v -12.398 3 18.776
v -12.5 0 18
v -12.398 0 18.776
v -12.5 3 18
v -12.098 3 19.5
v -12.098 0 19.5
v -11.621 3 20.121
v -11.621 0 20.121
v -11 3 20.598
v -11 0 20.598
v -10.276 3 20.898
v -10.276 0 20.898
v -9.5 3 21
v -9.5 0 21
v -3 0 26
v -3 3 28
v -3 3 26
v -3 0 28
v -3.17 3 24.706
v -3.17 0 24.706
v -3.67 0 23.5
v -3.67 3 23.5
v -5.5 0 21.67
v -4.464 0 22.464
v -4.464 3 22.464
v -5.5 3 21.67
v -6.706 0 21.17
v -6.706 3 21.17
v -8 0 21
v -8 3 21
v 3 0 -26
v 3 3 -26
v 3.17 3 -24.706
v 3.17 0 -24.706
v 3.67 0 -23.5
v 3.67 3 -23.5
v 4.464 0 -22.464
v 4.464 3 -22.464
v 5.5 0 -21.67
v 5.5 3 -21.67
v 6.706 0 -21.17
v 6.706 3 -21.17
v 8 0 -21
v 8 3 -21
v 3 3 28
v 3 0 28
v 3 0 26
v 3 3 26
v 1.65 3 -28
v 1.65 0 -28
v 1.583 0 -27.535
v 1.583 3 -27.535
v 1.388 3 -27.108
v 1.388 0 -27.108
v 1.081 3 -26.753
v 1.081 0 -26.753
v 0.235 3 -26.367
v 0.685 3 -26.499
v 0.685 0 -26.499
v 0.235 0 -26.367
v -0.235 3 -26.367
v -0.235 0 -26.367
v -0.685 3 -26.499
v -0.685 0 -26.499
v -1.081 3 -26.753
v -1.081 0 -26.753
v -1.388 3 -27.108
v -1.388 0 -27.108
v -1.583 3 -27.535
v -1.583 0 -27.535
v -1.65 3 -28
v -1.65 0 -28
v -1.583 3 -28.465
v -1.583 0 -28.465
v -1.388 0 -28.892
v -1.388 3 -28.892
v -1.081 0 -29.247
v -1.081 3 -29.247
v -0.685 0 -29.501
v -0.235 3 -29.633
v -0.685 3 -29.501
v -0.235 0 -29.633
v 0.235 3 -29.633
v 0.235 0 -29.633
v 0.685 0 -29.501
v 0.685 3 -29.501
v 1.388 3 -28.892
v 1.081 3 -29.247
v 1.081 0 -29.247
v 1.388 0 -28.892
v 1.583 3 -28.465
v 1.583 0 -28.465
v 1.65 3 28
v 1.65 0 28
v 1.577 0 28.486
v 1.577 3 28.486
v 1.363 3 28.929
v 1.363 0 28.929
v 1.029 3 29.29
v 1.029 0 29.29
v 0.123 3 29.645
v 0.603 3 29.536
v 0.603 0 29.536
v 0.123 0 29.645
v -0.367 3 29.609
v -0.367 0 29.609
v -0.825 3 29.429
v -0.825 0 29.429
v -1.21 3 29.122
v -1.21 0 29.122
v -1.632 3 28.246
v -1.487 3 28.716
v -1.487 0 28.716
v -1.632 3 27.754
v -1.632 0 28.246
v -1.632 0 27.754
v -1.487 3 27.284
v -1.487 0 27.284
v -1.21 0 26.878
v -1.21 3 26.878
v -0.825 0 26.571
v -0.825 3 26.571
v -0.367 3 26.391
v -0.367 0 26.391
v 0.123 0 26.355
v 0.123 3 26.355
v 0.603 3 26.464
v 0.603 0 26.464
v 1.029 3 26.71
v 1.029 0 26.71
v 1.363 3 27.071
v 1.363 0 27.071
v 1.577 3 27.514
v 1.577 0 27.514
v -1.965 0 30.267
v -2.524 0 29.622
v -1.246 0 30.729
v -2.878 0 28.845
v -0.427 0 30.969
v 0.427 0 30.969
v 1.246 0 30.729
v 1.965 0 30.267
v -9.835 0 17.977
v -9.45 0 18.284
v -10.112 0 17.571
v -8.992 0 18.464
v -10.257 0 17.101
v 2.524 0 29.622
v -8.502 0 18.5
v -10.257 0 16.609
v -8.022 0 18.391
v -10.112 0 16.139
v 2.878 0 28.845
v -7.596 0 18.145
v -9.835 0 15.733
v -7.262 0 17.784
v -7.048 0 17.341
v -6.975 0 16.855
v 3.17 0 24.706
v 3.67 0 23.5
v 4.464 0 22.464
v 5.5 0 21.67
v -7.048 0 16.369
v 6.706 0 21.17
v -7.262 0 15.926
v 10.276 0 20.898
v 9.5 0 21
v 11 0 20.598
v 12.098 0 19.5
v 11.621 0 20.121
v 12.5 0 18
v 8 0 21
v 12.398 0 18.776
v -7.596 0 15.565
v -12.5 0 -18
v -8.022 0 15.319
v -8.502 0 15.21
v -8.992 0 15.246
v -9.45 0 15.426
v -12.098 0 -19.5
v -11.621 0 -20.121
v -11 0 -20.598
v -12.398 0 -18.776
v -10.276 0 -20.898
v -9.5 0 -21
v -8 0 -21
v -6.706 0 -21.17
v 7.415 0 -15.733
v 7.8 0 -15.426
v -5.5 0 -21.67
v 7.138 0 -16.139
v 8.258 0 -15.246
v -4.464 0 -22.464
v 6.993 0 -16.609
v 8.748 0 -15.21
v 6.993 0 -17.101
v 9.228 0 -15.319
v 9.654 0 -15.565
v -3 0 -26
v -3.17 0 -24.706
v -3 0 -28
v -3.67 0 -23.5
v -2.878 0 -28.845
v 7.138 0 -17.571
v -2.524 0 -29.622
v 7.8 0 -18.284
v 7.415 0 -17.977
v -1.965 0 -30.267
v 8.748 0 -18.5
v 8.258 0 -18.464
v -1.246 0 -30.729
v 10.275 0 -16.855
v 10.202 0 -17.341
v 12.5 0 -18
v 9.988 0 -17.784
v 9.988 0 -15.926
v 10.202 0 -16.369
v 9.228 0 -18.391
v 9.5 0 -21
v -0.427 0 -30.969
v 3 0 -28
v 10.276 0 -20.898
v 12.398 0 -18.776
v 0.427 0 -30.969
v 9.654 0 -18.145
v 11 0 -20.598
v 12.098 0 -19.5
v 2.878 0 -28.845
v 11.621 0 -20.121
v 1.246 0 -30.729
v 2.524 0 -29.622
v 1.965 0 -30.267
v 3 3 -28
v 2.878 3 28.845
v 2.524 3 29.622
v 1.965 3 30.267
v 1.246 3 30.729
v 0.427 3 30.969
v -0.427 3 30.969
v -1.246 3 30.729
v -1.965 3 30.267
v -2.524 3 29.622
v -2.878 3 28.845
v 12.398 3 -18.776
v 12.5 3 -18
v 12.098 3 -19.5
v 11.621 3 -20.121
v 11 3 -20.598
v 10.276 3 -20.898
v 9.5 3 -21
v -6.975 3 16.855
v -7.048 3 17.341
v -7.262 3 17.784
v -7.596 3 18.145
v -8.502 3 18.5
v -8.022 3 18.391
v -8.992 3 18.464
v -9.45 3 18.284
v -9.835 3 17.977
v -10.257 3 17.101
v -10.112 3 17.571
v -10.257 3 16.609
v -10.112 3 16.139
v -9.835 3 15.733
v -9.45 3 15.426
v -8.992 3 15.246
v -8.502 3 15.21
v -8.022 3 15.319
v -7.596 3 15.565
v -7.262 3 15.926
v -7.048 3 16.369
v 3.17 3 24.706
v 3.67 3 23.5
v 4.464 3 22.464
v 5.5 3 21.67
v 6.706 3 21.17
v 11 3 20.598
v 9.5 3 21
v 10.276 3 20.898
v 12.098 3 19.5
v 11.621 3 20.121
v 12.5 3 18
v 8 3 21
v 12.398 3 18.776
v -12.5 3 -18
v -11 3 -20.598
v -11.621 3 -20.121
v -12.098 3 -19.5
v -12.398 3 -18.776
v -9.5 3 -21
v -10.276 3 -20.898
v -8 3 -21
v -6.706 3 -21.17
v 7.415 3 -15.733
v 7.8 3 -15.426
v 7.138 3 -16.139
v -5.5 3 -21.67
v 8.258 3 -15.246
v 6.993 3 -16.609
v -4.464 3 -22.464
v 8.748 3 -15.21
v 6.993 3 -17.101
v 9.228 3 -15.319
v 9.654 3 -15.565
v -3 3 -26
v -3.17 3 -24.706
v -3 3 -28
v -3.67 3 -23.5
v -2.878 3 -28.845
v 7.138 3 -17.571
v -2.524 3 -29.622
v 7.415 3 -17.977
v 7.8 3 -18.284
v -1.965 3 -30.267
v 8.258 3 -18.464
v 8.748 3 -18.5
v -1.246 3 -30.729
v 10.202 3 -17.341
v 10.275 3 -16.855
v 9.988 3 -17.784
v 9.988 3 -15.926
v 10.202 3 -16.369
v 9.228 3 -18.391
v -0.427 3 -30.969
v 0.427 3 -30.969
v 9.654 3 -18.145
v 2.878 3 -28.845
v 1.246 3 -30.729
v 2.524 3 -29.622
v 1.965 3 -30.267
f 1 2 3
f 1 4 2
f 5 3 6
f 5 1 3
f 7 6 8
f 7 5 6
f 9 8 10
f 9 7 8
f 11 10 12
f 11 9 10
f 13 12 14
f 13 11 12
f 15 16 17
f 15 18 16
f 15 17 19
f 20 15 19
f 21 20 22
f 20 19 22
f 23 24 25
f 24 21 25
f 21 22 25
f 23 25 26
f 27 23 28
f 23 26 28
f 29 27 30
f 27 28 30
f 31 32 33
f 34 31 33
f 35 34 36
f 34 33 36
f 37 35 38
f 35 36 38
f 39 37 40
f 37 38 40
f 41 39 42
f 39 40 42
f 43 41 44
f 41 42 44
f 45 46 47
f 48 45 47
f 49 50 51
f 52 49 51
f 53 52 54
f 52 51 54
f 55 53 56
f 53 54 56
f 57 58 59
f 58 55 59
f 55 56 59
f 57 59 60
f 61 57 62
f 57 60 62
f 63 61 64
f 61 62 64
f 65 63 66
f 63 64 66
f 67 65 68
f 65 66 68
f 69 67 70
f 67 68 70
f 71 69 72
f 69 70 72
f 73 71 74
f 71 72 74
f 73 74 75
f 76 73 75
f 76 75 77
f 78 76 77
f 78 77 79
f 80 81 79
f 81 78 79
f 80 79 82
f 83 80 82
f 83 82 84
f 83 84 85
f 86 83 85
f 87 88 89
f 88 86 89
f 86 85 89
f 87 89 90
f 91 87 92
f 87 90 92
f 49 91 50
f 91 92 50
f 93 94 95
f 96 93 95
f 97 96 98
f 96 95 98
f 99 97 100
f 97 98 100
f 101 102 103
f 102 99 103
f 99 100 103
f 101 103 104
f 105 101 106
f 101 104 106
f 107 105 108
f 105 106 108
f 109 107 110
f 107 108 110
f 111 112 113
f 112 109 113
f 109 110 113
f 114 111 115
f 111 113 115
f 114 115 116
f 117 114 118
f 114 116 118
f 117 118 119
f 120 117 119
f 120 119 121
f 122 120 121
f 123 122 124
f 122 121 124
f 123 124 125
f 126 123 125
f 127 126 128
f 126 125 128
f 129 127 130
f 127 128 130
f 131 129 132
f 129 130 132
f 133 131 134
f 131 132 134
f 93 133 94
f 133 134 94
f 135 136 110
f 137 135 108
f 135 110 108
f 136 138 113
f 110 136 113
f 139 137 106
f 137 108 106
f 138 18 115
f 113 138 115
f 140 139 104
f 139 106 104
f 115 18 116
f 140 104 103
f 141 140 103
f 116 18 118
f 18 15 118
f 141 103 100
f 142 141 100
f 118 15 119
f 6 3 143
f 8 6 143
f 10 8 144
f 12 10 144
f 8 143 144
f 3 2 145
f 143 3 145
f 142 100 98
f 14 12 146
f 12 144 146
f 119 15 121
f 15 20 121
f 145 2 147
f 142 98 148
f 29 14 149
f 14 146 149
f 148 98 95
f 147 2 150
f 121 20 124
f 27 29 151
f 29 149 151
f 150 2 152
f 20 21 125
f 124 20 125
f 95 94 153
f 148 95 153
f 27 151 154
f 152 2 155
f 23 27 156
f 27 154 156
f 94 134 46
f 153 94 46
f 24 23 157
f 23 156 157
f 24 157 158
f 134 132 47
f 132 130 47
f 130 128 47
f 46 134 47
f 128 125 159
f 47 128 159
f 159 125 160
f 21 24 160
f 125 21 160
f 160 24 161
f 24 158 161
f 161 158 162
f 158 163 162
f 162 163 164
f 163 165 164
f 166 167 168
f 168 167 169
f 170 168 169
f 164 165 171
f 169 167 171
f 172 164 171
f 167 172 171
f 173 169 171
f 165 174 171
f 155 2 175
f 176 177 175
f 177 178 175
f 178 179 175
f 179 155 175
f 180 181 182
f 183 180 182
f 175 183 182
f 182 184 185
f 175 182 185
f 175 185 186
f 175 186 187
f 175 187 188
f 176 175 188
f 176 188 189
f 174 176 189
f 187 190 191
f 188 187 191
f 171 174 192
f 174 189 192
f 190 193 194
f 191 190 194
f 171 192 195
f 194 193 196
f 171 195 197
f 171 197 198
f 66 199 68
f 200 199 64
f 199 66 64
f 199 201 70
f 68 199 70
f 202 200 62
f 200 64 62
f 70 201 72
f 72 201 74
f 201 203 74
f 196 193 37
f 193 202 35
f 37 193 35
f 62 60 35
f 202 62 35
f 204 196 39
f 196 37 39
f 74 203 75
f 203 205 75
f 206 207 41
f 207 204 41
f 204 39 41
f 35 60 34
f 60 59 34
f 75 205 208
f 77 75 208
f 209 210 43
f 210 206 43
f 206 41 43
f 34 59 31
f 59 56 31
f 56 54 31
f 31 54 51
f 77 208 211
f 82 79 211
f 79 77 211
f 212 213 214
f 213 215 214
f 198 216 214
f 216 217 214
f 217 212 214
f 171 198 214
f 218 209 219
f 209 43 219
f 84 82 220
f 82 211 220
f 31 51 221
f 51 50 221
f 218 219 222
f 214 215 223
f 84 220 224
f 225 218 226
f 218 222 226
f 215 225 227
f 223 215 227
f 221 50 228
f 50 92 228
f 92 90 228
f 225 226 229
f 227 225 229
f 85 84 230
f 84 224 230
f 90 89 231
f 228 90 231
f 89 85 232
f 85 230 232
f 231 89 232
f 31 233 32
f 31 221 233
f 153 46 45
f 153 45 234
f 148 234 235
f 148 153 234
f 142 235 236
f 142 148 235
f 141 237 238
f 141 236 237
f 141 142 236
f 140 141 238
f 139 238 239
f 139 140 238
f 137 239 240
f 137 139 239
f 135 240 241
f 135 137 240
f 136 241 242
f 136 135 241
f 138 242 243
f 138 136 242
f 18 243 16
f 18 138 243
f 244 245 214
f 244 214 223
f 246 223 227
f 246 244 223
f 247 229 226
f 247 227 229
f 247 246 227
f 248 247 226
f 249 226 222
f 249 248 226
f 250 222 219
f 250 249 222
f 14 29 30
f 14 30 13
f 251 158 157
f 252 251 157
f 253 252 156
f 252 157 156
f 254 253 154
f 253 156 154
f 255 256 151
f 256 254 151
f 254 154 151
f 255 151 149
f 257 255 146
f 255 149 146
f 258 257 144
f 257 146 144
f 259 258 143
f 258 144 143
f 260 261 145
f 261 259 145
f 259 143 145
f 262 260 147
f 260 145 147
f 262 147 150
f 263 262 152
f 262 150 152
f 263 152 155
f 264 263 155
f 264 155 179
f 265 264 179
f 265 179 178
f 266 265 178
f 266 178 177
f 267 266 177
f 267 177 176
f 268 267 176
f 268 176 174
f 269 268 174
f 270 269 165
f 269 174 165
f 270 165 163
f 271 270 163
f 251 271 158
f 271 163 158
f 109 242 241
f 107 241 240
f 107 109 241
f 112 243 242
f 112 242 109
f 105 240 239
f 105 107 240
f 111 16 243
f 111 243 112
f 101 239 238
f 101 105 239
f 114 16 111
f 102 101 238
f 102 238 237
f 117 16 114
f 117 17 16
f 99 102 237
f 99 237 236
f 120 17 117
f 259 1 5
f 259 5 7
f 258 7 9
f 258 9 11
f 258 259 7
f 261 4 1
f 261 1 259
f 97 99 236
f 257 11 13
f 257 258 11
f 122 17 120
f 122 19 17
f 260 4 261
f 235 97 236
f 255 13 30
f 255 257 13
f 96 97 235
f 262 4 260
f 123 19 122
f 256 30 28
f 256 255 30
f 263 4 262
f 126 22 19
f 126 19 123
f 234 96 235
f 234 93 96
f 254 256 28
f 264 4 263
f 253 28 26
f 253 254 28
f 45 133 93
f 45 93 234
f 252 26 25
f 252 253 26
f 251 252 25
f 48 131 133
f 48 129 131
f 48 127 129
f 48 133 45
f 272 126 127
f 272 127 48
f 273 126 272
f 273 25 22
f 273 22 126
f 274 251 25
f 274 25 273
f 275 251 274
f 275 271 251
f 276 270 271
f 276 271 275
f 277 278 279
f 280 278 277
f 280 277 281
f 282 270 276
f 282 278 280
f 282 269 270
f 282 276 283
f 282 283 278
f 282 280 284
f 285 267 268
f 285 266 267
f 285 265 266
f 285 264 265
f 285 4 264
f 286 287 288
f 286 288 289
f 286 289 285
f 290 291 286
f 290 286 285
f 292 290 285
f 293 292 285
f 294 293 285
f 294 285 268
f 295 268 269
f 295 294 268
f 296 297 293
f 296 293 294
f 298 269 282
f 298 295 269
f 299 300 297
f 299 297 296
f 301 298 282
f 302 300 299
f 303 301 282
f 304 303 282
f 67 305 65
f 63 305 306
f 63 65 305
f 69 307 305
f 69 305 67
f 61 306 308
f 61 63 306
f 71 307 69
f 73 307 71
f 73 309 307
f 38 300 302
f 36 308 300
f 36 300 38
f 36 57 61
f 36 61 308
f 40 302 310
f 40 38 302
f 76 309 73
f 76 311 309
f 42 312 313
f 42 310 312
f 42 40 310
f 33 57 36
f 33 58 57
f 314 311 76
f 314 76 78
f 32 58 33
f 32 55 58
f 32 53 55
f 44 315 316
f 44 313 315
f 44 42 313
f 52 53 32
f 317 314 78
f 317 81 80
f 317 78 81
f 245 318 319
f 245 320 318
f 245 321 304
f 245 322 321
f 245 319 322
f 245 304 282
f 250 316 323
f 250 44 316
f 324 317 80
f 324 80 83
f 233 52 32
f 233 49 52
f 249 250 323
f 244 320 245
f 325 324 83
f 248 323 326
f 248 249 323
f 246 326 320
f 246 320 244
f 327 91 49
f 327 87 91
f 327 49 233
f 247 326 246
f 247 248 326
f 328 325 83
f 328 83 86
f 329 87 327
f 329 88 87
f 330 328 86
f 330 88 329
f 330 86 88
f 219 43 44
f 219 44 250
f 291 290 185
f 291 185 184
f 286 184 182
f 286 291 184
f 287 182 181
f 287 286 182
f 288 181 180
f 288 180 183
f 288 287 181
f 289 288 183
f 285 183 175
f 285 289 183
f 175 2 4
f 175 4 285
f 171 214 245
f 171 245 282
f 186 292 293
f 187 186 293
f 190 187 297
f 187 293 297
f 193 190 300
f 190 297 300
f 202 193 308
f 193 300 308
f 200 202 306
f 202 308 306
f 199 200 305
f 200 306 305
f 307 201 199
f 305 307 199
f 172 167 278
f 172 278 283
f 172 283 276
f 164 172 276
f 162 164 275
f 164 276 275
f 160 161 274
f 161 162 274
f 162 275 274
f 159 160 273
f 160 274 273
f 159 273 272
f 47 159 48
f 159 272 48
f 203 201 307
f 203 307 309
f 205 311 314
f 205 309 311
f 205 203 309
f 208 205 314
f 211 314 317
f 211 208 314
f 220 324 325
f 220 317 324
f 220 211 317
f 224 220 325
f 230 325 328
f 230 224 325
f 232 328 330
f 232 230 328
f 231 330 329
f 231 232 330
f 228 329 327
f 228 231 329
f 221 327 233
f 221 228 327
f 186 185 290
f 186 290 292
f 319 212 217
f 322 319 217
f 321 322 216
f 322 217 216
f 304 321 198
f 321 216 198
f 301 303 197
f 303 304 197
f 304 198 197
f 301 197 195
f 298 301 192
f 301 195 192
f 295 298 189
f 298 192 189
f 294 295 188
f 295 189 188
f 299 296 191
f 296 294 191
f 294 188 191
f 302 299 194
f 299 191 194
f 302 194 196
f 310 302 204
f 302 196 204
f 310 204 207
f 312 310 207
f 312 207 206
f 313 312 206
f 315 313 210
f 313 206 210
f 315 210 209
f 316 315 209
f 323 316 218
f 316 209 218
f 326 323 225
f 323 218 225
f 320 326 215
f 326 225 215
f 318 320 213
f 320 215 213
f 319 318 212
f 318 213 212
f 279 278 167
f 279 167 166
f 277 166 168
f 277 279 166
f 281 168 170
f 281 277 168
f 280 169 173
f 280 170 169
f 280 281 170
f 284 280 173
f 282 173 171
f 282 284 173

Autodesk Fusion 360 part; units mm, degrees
sketch "Sketch1" plane through (0, 0, 0) normal (0, 1, 0) x (1, 0, 0)
  line L0 (-12.5, 21) -> (12.5, 21)
  line L1 (12.5, 21) -> (12.5, -21)
  line L2 (12.5, -21) -> (-12.5, -21)
  line L3 (-12.5, -21) -> (-12.5, 21)
  line L4 (-12.5, 21) -> (12.5, -21) construction
  line L5 (12.5, 21) -> (-12.5, -21) construction
  line L6 (-8.625, 16.855) -> (8.625, 16.855) construction
  line L7 (8.625, 16.855) -> (8.625, -16.855) construction
  line L8 (8.625, -16.855) -> (-8.625, -16.855) construction
  line L9 (-8.625, -16.855) -> (-8.625, 16.855) construction
  line L10 (-8.625, 16.855) -> (8.625, -16.855) construction
  line L11 (8.625, 16.855) -> (-8.625, -16.855) construction
  circle A0 centre (8.625, 16.855) radius 1.65
  circle A1 centre (-8.625, -16.855) radius 1.65
  line L12 (0, 0) -> (0, 28) construction
  line L13 (0, 0) -> (0, -28) construction
  circle A2 centre (0, 28) radius 1.65
  line L14 (0, 28) -> (-1.65, 28) construction
  circle A3 centre (0, 28) radius 3
  line L15 (0, 28) -> (-3, 28)
  line L16 (-3, 28) -> (-3, 21)
  line L17 (3, 28) -> (3, 21)
  line L18 (-3, -28) -> (-3, -21)
  circle A4 centre (0, -28) radius 3
  line L19 (3, -28) -> (3, -21)
  circle A5 centre (0, -28) radius 1.65
  line L20 (0, 0) -> (12.5, 0) construction
  dimension "d1" = 25
  dimension "d2" = 42
  dimension "d3" = 17.25
  dimension "d4" = 33.71
  dimension "d9" = 3.3
  dimension "d10" = 3.3
  dimension "d13" = 28
  dimension "d14" = 28
  dimension "d15" = 3.3
  dimension "d17" = 6
extrude "Extrude2" add sketch "Sketch1" along normal blind 3
fillet "Fillet2" radius 3 4 edges at (12.5, 1.5, 21) (-12.5, 1.5, 21) (12.5, 1.5, -21) (-12.5, 1.5, -21)
fillet "Fillet3" radius 5 4 edges at (3, 1.5, 21) (-3, 1.5, 21) (-3, 1.5, -21) (3, 1.5, -21)
